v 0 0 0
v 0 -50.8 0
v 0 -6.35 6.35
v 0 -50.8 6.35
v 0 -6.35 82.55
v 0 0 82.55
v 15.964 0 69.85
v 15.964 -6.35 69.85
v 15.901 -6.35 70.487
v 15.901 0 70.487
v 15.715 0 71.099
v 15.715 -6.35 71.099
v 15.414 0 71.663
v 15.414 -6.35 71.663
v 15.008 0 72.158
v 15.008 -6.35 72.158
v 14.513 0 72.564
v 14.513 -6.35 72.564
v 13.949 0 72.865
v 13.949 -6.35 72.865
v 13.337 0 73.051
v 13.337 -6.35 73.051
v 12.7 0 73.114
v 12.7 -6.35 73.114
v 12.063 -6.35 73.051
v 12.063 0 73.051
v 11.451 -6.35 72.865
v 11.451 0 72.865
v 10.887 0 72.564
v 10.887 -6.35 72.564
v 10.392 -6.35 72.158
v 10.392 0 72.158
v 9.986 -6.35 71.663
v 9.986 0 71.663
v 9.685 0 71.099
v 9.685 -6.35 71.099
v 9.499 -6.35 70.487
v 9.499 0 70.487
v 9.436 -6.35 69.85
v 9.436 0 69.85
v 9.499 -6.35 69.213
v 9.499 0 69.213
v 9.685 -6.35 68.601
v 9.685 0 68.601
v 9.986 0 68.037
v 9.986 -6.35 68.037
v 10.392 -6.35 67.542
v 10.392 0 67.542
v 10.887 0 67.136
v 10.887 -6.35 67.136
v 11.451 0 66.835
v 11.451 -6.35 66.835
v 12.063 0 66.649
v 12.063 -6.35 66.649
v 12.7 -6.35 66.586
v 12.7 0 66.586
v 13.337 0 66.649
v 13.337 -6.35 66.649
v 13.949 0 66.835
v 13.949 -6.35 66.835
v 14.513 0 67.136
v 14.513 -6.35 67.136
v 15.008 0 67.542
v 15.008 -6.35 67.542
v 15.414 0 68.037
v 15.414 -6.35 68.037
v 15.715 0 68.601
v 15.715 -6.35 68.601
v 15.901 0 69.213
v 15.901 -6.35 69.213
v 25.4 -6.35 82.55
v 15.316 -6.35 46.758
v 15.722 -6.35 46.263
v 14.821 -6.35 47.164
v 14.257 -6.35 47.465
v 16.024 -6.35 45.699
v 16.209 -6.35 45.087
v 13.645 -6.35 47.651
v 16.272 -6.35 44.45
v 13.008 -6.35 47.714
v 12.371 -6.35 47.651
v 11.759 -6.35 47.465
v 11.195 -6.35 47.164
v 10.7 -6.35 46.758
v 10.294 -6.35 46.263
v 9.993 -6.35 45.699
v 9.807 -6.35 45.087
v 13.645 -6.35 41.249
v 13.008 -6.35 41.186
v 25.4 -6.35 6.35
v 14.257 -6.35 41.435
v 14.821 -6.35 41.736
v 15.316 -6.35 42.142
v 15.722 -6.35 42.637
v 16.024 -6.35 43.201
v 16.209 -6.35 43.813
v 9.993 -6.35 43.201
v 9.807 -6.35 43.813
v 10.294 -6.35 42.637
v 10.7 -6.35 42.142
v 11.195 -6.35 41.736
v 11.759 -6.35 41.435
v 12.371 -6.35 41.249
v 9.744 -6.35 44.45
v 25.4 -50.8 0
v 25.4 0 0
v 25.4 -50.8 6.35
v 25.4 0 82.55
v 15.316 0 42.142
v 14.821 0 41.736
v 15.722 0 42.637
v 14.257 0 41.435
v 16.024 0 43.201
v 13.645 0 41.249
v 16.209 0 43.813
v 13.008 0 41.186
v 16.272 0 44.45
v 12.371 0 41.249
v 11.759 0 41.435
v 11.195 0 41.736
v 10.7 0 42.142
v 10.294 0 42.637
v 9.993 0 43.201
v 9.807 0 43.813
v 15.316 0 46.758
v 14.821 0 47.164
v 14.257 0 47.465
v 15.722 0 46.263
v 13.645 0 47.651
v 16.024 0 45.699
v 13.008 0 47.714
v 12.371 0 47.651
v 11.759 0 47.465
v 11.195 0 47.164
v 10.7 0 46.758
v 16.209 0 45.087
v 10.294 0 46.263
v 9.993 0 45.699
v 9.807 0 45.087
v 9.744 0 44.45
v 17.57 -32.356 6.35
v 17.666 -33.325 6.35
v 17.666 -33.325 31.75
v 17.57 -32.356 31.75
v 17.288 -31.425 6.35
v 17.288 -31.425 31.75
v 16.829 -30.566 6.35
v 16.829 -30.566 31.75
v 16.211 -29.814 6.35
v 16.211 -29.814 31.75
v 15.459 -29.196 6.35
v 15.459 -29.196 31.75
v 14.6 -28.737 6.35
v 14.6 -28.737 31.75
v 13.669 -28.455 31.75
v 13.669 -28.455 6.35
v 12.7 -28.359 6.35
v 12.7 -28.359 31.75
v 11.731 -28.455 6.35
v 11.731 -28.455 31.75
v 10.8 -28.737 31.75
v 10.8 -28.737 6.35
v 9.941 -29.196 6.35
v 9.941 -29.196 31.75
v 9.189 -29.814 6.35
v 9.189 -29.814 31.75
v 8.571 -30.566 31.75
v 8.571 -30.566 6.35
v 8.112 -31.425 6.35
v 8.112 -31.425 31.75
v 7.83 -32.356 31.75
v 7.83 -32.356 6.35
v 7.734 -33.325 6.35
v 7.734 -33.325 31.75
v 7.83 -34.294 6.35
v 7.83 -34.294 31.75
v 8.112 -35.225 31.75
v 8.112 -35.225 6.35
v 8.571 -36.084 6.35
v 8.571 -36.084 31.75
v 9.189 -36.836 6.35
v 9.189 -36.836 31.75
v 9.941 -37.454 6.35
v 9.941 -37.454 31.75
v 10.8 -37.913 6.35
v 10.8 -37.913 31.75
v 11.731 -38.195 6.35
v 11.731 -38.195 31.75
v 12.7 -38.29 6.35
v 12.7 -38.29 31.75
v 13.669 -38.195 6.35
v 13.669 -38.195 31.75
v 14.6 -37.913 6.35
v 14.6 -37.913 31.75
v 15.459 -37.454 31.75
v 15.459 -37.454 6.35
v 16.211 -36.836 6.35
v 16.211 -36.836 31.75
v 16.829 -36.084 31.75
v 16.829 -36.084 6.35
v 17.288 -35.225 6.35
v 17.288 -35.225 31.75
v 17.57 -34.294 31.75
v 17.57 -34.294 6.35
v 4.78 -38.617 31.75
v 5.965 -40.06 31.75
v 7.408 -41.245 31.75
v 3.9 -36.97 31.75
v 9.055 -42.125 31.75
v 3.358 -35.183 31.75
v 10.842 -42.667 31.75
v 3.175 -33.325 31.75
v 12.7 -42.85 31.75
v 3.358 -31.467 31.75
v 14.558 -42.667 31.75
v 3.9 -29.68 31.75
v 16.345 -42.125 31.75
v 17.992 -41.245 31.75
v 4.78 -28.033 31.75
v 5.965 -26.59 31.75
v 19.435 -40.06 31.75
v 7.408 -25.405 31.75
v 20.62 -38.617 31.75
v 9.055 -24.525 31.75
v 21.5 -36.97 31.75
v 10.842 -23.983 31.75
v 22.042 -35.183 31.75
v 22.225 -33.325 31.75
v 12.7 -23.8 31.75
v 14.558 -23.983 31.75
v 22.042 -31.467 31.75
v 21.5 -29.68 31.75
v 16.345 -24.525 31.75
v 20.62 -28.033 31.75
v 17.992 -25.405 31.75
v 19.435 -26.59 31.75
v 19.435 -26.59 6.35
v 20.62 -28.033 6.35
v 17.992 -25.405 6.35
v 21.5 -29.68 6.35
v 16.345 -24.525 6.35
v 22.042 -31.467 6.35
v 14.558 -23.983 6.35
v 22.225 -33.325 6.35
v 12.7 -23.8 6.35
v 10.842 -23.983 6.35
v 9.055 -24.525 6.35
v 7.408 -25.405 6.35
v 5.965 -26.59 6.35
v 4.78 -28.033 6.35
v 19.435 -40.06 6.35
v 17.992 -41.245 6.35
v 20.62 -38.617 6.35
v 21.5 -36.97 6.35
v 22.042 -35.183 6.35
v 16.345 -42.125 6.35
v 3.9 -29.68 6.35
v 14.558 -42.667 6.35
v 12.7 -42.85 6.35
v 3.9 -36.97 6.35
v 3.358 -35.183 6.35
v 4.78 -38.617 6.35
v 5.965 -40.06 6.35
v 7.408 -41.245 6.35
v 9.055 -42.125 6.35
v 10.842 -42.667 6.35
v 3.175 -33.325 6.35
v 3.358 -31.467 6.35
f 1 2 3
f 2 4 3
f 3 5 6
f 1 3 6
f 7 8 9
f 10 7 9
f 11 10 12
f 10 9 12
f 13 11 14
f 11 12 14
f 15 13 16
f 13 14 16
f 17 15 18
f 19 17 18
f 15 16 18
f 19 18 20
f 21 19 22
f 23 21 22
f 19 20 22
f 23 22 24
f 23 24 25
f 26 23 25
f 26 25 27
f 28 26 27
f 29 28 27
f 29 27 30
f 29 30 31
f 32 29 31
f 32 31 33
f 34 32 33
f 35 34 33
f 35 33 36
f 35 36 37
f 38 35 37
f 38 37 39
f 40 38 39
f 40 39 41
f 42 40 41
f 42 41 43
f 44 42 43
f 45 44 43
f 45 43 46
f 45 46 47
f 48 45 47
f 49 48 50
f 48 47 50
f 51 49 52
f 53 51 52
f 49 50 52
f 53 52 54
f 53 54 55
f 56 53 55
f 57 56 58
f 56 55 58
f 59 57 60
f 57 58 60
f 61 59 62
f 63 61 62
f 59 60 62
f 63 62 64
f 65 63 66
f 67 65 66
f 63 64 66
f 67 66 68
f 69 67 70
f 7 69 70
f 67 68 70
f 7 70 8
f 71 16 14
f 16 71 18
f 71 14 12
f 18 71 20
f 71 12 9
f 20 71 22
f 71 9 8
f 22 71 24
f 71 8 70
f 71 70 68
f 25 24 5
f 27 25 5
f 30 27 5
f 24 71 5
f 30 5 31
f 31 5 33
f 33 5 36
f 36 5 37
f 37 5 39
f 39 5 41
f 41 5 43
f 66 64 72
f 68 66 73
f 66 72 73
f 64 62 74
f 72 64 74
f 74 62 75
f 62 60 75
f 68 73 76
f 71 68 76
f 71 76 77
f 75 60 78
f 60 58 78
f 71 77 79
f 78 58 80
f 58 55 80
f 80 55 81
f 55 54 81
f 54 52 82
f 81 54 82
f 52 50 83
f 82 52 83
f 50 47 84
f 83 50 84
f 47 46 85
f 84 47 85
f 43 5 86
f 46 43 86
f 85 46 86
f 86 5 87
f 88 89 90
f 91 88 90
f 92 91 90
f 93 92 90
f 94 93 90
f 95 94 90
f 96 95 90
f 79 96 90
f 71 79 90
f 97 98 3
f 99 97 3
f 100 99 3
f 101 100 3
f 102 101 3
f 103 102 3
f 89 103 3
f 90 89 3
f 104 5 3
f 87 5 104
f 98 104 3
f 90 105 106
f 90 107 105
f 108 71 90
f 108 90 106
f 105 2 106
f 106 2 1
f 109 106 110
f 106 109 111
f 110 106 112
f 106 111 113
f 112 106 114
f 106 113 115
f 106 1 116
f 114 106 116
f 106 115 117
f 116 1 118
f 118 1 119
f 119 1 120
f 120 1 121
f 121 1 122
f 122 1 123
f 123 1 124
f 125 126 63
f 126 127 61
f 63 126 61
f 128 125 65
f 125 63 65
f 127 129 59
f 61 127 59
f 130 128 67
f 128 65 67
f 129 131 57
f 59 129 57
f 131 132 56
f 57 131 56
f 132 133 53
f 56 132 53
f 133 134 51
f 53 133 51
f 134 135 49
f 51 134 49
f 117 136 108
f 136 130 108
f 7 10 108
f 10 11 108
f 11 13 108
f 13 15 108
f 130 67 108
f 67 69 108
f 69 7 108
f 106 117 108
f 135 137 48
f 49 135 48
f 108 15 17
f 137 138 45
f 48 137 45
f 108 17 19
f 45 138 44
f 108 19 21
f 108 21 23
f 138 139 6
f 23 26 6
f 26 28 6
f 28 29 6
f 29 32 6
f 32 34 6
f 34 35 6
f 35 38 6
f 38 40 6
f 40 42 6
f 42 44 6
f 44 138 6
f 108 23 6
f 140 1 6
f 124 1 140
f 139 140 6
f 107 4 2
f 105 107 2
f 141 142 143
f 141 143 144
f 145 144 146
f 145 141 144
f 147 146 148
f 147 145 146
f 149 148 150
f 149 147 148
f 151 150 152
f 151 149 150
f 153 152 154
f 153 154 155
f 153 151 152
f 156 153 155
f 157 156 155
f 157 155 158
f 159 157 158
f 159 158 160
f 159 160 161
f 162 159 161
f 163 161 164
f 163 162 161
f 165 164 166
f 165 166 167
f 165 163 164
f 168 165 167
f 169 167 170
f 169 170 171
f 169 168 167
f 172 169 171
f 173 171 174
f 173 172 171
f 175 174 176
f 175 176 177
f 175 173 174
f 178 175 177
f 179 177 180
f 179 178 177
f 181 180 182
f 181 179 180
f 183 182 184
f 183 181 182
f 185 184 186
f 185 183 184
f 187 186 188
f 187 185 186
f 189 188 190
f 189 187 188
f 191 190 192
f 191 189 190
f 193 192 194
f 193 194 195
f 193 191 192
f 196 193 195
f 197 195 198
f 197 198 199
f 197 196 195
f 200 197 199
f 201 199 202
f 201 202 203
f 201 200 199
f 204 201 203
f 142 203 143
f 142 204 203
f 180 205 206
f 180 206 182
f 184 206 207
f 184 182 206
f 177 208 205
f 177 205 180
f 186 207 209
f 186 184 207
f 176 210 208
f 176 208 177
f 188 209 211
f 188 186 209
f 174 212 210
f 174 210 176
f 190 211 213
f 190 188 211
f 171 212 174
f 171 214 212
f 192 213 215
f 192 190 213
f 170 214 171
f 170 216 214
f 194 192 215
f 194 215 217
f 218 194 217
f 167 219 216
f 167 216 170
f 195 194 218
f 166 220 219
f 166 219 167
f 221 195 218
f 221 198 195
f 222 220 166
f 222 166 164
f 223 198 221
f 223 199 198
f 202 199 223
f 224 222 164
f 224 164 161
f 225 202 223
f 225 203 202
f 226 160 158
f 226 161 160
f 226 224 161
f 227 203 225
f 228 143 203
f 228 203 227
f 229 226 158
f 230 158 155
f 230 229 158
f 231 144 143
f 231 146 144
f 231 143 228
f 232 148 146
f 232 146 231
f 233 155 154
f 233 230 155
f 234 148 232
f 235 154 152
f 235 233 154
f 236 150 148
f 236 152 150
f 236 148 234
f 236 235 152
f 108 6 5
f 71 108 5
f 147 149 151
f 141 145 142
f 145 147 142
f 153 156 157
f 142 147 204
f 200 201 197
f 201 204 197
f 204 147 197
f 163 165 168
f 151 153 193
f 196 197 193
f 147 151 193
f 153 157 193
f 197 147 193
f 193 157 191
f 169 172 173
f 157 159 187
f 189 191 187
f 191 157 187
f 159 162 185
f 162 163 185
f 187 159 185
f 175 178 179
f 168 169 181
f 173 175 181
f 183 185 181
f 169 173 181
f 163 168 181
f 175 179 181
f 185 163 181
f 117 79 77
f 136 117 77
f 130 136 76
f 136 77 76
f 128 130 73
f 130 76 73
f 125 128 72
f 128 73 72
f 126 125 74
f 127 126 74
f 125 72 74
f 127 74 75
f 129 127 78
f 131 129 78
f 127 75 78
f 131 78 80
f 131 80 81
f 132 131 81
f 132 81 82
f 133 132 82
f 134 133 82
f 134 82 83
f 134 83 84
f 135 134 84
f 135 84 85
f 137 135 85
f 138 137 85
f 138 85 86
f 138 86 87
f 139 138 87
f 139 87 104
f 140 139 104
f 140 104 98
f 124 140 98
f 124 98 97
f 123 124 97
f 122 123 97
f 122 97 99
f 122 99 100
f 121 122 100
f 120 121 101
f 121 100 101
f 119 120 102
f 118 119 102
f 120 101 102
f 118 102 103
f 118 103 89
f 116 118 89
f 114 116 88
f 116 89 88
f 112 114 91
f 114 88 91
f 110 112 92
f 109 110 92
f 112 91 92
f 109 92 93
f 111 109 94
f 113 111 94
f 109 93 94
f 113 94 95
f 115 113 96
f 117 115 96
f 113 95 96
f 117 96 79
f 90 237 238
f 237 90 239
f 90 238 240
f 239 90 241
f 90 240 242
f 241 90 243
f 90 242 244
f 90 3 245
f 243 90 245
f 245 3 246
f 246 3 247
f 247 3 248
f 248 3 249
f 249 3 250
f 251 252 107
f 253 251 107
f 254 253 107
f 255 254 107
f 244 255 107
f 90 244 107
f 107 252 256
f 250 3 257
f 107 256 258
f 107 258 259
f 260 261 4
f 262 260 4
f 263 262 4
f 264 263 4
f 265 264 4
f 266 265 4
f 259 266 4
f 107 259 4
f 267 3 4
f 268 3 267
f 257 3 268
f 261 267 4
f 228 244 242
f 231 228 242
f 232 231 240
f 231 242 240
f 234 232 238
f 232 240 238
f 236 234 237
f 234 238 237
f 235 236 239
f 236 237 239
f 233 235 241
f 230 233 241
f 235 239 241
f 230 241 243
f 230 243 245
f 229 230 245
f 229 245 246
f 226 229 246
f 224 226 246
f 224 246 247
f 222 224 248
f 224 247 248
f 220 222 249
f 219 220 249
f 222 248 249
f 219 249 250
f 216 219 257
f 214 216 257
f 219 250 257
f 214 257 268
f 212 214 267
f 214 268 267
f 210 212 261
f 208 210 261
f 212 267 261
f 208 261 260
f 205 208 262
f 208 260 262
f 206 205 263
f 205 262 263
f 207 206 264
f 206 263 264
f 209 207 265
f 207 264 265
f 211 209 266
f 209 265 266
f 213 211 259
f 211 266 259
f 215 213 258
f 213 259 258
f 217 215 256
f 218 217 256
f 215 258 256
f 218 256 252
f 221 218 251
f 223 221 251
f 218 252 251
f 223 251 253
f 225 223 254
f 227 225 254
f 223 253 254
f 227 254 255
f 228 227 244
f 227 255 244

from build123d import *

# Parameters (mm, degrees)
F1_DEPTH = 25.4
F2_R     = 9.525
F2_R_2   = 4.9657
F3_DEPTH = 25.4
F4_R     = 3.2639
F5_DEPTH = 25.4


with BuildPart() as f1:
    # F0 (on Right) → F1 (new body)
    with BuildSketch(Plane.YZ):
        Polygon((-50.8, 0), (0, 0), (0, 82.55), (-6.35, 82.55), (-6.35, 6.35), (-50.8, 6.35), align=None)
    extrude(amount=F1_DEPTH)

    # F2 (on face) → F3 (join)
    with BuildSketch(Plane.XY.offset(6.35)):
        with Locations((12.7, -33.3248)):
            Circle(F2_R)
        with Locations((12.7, -33.3248)):
            Circle(F2_R_2, mode=Mode.SUBTRACT)
    extrude(amount=F3_DEPTH)

    # F4 (on face) → F5 (cut)
    with BuildSketch(Plane.XZ.offset(6.35)):
        with Locations((12.7, 69.85)):
            Circle(F4_R)
        with Locations((13.008095, 44.45)):
            Circle(F4_R)
    extrude(amount=-F5_DEPTH, mode=Mode.SUBTRACT)


solid = f1.part
